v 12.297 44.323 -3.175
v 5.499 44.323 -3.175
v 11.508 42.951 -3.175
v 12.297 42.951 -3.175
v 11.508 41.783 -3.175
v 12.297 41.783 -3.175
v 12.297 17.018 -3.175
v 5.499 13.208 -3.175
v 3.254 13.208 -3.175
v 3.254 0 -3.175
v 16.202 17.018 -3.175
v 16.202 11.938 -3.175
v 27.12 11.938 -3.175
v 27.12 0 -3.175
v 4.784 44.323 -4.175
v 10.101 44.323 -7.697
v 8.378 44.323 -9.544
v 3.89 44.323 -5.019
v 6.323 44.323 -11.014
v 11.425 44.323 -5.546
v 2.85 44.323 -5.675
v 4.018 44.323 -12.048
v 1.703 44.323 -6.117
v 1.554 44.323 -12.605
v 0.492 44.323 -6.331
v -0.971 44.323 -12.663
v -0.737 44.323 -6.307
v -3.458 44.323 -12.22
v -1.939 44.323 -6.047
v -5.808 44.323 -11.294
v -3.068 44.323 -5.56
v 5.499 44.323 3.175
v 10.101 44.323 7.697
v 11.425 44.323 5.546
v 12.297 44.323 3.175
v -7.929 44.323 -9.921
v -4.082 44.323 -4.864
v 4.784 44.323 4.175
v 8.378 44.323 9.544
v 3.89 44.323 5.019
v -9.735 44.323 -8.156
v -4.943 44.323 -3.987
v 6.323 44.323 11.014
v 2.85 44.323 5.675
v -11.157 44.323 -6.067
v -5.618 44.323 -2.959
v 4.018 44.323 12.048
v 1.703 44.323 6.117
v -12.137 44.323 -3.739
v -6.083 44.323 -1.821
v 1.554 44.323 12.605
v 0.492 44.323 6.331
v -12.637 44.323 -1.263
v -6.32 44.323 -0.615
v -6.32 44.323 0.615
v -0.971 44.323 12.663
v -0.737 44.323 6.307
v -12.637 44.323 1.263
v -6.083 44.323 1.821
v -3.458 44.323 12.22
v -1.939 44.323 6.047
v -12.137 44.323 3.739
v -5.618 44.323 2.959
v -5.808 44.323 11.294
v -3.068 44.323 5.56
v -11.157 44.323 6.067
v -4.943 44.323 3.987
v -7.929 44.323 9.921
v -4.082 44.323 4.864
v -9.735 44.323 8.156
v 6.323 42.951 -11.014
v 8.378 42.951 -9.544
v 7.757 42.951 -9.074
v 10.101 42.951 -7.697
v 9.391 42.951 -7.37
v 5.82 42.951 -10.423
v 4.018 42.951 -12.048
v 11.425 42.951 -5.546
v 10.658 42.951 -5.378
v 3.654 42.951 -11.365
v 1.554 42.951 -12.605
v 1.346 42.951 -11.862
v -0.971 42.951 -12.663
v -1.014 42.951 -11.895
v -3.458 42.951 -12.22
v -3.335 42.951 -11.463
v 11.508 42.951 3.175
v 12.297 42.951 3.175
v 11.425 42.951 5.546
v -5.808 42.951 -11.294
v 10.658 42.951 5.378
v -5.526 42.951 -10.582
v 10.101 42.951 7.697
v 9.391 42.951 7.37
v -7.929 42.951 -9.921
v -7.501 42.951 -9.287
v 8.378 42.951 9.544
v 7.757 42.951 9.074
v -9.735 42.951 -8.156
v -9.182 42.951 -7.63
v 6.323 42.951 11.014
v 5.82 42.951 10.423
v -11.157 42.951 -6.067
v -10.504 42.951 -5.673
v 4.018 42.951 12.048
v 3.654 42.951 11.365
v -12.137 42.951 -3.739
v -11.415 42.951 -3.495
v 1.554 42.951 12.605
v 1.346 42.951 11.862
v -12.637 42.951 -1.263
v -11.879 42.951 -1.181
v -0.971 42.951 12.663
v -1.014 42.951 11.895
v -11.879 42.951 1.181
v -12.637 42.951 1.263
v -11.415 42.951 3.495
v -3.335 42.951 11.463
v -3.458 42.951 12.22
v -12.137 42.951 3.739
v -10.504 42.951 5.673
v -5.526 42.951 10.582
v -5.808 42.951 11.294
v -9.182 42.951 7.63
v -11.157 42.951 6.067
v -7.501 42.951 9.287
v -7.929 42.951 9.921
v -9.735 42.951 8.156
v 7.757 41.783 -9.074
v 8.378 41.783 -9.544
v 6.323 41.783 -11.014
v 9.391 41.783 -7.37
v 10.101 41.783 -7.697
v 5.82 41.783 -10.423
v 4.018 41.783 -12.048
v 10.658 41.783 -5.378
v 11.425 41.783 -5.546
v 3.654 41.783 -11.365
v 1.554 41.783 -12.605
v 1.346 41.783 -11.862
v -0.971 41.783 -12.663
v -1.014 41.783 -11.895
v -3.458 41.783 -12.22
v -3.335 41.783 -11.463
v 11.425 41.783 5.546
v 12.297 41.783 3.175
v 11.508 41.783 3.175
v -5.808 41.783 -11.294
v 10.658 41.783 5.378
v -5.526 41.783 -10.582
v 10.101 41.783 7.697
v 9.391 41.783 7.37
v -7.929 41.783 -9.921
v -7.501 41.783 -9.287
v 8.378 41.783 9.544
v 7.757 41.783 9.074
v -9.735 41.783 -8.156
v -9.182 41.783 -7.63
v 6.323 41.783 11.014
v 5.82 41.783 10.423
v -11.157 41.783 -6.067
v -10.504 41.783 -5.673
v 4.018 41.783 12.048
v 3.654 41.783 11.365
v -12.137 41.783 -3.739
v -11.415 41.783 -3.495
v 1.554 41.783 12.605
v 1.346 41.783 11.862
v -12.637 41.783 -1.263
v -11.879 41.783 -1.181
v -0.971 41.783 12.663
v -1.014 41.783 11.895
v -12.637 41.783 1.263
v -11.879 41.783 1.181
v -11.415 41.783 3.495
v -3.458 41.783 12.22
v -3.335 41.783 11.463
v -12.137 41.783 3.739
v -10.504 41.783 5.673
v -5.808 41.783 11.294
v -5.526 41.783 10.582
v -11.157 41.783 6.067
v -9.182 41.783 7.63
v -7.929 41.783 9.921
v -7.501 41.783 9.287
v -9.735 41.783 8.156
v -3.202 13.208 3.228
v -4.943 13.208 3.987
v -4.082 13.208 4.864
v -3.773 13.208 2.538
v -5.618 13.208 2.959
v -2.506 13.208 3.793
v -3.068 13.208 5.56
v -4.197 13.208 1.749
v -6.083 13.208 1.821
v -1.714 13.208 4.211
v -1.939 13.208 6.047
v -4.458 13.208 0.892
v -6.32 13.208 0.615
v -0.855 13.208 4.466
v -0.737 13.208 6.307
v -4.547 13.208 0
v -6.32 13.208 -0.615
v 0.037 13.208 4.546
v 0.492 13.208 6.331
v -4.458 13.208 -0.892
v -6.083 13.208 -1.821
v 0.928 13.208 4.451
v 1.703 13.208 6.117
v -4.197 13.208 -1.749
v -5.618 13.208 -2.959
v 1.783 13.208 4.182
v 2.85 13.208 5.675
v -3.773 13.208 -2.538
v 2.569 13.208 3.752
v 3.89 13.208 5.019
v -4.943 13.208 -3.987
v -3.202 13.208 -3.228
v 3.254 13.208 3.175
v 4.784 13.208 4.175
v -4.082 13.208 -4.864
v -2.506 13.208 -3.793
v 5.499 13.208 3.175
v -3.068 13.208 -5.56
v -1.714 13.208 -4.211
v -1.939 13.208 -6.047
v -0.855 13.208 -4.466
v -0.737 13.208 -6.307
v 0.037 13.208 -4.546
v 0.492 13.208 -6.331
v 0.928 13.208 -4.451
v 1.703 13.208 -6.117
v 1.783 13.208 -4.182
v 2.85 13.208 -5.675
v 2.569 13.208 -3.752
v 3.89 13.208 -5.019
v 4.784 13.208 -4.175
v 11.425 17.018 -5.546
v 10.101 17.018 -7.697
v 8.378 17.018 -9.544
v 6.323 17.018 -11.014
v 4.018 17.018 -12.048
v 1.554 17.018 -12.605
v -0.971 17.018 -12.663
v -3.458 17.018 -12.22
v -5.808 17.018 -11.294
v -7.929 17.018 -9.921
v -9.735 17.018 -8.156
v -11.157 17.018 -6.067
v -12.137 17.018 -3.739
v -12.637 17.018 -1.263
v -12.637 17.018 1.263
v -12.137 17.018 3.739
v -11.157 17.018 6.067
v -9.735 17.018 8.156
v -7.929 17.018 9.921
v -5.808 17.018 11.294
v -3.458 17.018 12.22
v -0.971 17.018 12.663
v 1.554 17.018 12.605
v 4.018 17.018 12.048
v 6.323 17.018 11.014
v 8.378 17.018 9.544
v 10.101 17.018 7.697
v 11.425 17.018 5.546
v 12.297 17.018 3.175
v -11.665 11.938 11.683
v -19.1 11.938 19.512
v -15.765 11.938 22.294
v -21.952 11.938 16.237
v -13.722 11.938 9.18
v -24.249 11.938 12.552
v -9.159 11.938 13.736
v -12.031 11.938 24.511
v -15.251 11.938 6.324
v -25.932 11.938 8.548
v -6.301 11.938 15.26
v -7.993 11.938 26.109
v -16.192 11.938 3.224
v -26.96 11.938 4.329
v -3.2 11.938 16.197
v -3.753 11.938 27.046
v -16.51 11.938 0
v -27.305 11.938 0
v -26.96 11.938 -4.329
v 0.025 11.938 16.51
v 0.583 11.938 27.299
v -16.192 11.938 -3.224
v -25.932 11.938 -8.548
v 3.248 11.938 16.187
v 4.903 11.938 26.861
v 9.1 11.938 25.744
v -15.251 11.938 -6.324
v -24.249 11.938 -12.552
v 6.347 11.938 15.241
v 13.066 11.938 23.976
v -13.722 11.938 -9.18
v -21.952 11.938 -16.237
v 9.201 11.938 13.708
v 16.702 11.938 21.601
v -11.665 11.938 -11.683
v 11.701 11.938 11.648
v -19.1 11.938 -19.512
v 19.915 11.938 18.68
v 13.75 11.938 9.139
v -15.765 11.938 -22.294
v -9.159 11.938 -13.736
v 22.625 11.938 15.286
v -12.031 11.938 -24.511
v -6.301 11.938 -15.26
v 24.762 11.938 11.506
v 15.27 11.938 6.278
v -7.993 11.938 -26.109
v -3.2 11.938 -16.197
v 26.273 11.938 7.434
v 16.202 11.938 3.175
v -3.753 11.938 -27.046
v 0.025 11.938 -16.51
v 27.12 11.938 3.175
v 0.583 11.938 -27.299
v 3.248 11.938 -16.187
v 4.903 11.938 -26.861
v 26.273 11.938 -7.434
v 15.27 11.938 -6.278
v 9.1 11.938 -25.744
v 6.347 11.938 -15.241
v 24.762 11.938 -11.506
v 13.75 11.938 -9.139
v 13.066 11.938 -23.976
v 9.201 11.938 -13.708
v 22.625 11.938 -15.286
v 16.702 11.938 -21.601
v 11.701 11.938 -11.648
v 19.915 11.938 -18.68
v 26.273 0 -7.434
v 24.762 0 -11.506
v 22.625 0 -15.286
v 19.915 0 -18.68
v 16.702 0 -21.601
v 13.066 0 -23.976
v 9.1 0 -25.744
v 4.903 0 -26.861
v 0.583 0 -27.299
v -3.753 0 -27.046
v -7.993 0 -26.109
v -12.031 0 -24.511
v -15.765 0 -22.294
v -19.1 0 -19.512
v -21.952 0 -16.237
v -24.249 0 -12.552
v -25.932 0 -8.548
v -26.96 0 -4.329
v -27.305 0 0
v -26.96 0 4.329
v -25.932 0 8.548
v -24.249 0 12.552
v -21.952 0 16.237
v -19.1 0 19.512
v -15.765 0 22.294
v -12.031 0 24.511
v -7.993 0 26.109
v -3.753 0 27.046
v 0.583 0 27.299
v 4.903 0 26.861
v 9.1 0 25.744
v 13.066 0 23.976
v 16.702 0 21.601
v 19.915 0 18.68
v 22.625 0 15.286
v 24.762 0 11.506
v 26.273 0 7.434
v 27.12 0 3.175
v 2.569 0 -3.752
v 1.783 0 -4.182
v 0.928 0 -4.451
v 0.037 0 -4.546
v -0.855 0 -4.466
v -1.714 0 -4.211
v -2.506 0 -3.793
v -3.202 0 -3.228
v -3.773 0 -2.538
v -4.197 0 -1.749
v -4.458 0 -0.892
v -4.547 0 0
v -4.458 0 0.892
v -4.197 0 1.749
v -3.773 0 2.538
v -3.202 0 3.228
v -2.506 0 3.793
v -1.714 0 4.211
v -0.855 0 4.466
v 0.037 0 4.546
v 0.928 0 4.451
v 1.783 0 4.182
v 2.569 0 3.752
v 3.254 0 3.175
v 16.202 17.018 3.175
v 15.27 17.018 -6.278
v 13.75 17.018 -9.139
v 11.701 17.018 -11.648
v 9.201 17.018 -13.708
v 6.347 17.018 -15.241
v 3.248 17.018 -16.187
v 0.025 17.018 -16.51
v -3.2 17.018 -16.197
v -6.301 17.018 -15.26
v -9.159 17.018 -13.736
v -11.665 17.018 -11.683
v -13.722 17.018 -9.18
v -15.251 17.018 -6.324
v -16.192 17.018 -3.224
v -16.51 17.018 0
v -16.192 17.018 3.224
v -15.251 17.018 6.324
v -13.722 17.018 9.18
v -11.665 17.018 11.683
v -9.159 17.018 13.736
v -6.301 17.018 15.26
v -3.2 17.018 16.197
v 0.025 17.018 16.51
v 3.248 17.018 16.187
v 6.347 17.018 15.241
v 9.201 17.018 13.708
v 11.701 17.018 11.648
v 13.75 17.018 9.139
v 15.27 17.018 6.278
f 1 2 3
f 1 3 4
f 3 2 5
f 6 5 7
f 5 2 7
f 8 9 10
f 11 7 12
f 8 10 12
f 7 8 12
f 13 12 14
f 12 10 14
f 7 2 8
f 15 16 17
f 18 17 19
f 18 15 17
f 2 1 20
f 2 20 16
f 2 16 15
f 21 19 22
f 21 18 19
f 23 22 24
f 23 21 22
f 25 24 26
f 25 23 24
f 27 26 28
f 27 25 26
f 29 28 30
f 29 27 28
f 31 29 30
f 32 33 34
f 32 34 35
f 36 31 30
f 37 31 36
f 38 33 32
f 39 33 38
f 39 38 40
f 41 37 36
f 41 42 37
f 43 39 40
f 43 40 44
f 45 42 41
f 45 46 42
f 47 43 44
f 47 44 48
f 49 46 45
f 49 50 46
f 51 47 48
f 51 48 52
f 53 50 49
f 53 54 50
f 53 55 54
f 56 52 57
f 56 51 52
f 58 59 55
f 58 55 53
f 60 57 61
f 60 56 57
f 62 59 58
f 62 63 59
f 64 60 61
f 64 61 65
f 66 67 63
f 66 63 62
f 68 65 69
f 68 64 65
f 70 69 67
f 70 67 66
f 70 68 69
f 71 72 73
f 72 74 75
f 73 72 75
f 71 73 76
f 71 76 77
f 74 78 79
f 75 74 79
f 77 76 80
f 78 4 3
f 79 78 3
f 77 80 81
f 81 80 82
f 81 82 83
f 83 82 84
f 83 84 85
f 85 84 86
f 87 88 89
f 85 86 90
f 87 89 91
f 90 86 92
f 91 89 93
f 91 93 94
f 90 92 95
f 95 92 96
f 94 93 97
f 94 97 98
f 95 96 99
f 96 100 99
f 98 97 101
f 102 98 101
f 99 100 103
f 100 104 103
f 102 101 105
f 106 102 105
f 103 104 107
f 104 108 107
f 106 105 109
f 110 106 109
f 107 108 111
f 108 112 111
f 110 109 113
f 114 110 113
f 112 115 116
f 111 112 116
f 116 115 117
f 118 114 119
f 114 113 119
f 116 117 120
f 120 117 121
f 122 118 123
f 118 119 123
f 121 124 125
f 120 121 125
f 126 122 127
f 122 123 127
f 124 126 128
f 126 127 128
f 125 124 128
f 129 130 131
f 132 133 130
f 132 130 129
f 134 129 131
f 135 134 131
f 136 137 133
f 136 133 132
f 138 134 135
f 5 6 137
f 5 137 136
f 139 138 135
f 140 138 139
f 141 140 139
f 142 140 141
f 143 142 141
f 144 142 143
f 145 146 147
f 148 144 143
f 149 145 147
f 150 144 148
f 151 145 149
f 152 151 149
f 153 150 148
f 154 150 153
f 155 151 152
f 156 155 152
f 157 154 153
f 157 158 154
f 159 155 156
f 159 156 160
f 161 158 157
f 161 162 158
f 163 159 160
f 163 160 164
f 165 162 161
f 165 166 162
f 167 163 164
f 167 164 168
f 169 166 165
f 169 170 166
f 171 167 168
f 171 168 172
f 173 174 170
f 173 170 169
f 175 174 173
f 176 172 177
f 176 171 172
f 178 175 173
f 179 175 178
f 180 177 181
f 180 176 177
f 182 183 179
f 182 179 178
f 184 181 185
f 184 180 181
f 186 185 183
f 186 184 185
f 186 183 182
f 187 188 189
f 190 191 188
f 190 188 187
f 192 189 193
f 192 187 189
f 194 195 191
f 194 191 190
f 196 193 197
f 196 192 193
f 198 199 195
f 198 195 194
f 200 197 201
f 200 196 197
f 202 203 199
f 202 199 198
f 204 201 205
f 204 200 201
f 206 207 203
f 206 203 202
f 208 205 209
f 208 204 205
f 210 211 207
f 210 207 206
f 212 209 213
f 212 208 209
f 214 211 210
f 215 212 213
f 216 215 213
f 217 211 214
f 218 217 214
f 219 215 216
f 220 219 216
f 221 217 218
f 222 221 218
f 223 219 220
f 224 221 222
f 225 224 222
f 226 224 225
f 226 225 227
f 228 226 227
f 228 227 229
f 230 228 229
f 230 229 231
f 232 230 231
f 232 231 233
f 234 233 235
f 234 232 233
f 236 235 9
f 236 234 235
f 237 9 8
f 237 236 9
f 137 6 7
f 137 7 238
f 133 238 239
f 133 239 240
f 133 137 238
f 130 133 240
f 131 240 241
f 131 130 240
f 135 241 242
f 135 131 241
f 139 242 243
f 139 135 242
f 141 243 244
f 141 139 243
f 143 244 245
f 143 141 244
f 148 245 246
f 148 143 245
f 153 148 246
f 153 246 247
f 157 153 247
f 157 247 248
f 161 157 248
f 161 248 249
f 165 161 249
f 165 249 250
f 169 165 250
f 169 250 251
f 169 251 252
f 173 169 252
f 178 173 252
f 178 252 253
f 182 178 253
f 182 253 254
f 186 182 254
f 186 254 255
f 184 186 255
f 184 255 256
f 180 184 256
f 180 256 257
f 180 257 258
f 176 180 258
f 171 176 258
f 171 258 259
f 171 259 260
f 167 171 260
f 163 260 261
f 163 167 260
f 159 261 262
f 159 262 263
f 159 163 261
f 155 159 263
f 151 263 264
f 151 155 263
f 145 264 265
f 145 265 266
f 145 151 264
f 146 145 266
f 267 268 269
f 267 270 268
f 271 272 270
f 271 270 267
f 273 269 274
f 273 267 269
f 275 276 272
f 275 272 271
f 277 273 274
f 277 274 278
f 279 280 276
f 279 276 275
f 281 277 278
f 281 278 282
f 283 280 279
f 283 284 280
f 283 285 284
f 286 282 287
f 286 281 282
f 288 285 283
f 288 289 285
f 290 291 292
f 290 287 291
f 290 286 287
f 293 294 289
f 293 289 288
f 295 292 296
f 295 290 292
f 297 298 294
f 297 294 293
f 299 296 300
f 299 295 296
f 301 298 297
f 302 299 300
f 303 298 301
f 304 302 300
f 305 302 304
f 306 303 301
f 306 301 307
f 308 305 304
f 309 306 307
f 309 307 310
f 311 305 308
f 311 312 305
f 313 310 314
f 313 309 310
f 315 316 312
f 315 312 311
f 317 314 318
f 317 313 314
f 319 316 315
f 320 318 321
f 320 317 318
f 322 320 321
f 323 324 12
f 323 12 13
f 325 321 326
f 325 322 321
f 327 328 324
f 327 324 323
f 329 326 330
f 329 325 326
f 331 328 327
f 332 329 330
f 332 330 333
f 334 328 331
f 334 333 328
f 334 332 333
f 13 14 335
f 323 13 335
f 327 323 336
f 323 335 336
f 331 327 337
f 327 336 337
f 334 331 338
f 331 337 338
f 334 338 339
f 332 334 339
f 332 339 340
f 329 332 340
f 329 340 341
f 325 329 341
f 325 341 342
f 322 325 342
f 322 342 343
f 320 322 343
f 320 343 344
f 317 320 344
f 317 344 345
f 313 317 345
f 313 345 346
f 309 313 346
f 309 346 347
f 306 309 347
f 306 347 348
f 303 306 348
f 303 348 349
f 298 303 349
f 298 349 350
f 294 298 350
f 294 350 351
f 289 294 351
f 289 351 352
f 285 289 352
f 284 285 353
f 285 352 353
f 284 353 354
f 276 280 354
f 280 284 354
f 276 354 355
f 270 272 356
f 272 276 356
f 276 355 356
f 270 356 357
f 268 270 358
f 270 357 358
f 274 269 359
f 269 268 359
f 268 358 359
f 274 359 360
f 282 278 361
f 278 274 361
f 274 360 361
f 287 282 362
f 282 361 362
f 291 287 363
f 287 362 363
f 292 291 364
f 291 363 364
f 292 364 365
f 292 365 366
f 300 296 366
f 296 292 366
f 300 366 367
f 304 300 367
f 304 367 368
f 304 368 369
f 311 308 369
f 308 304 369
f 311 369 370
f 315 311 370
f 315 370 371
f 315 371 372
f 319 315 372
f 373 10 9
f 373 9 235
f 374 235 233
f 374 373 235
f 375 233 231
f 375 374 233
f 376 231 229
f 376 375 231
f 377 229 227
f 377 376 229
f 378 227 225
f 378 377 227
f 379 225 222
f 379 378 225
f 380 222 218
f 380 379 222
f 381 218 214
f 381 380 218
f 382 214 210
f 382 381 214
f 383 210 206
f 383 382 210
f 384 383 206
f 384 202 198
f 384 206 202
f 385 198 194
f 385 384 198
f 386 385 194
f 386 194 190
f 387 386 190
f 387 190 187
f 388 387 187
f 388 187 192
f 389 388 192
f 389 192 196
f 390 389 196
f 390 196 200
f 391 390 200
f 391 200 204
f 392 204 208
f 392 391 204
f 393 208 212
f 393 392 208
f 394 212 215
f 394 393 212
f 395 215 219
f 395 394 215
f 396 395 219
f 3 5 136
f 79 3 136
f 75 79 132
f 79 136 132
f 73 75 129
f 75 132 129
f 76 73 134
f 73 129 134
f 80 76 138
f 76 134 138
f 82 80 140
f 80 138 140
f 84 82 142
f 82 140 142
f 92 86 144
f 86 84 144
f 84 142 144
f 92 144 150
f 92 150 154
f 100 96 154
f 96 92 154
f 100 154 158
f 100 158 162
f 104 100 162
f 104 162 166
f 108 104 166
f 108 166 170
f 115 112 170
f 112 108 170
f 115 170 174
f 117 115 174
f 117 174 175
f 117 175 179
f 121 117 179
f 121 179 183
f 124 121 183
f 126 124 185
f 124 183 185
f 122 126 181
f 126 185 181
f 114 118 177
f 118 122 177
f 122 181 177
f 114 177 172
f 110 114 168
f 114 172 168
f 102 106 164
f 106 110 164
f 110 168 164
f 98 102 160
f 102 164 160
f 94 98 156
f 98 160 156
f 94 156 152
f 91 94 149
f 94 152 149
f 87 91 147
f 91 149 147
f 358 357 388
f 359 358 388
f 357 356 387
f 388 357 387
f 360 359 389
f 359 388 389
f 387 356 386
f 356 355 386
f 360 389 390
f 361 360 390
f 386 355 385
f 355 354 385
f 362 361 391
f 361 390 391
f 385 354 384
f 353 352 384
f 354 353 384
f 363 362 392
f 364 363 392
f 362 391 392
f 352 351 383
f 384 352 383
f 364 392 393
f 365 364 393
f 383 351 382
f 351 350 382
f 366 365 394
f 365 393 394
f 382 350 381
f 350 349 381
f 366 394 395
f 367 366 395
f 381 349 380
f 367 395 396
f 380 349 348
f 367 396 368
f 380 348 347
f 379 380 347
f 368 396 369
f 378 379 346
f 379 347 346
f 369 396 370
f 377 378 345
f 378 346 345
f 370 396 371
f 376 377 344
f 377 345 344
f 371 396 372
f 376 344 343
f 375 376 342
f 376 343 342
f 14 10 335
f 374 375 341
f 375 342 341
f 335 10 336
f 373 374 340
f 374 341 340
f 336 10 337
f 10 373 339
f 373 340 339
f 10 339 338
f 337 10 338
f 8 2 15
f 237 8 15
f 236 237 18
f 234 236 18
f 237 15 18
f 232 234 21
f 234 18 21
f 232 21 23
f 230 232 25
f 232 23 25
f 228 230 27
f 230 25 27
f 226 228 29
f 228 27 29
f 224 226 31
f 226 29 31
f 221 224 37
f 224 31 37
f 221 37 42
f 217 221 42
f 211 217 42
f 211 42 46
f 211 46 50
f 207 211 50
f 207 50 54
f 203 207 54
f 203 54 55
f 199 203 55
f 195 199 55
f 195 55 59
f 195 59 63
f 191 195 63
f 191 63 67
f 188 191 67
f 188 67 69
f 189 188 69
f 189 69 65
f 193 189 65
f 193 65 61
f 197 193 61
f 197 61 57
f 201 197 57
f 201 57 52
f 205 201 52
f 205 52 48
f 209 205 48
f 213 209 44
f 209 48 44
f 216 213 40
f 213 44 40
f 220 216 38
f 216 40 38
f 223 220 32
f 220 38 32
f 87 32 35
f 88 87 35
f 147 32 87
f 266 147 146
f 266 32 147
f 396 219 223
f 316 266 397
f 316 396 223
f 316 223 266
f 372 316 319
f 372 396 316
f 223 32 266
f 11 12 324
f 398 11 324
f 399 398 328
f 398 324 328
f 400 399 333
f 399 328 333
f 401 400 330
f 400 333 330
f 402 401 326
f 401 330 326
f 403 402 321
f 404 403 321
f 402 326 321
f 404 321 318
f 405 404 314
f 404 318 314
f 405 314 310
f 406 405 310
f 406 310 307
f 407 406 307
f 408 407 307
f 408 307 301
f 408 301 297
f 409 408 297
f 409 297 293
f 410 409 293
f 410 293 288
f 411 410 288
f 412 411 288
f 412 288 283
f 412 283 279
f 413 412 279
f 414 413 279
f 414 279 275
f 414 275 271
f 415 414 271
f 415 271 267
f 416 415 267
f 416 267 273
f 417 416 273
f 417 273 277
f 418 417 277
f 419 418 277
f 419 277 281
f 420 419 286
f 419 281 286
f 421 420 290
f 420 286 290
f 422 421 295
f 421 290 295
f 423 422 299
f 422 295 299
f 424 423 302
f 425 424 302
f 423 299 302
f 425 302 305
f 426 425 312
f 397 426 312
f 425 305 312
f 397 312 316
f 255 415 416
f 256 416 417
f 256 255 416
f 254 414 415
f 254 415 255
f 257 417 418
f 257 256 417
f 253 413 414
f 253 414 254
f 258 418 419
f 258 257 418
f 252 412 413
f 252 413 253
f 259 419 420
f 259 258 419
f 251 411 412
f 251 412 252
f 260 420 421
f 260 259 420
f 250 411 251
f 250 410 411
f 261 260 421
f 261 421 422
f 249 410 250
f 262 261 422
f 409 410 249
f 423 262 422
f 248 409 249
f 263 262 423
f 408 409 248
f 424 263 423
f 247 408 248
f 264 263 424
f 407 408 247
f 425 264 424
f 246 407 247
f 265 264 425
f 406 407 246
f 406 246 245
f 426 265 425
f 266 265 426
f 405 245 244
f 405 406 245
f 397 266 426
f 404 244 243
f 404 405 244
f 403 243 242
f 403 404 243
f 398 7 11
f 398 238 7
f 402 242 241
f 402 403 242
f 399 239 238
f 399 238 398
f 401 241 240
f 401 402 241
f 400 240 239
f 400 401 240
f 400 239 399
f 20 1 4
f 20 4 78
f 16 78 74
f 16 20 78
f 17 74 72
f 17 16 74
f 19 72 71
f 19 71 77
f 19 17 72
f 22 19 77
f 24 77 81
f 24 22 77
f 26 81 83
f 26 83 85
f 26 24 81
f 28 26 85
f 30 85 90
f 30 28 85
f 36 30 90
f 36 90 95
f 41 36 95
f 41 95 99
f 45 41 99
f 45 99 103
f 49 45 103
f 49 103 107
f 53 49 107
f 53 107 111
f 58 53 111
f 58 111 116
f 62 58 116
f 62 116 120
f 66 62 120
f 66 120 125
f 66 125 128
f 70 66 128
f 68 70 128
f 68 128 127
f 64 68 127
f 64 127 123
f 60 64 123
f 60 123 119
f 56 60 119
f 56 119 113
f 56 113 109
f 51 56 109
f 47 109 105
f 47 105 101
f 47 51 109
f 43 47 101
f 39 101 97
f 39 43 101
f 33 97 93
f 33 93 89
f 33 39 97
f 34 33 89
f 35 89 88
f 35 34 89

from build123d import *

# Parameters (mm, degrees)
SKETCH1_R           = 27.305
SKETCH1_R_2         = 4.5466
BOSS_EXTRUDE1_DEPTH = 57.658
SKETCH2_R           = 6.35
CUT_EXTRUDE1_DEPTH  = 44.45
SKETCH3_OUTSIDE_W   = 75.886
SKETCH3_OUTSIDE_H   = 75.886
SKETCH3_OUTSIDE_R   = 12.7
CUT_EXTRUDE2_DEPTH  = 44.45
SKETCH10_W          = 30.679481275
SKETCH10_H          = 6.35
CUT_EXTRUDE7_DEPTH  = 6.35
SKETCH13_OUTSIDE_W  = 75.886
SKETCH13_OUTSIDE_H  = 75.886
SKETCH13_OUTSIDE_R  = 11.938
CUT_EXTRUDE9_DEPTH  = 1.1684
SKETCH16_R          = 46.08237905
CUT_EXTRUDE11_DEPTH = 59.784814187
BOSS_EXTRUDE4_START = 3.81
SKETCH18_R          = 16.51
SKETCH18_R_2        = 12.7
BOSS_EXTRUDE4_DEPTH = 3.81
SKETCH19_OUTSIDE_W  = 74.42
SKETCH19_OUTSIDE_H  = 74.42
SKETCH19_OUTSIDE_R  = 16.51
CUT_EXTRUDE12_DEPTH = 1.27
SKETCH10_2_W        = 30.679481275
SKETCH10_2_H        = 6.35
CUT_EXTRUDE13_DEPTH = 59.784814187


with BuildPart() as part:
    # Sketch1 → Boss-Extrude1 (new body)
    with BuildSketch(Plane(origin=(0, 0, 0), x_dir=(1, 0, 0), z_dir=(0, 1, 0))):
        Circle(SKETCH1_R)
        Circle(SKETCH1_R_2, mode=Mode.SUBTRACT)
    extrude(amount=BOSS_EXTRUDE1_DEPTH)

    # Sketch2 → Cut-Extrude1 (cut)
    with BuildSketch(Plane(origin=(0, 57.658, 0), x_dir=(1, 0, 0), z_dir=(0, 1, 0))):
        Circle(SKETCH2_R)
    extrude(amount=-CUT_EXTRUDE1_DEPTH, mode=Mode.SUBTRACT)

    # Sketch3 outside → Cut-Extrude2 (cut)
    with BuildSketch(Plane(origin=(0, 57.658, 0), x_dir=(1, 0, 0), z_dir=(0, 1, 0))):
        Rectangle(SKETCH3_OUTSIDE_W, SKETCH3_OUTSIDE_H)
        Circle(SKETCH3_OUTSIDE_R, mode=Mode.SUBTRACT)
    extrude(amount=-CUT_EXTRUDE2_DEPTH, mode=Mode.SUBTRACT)

    # Sketch10 → Cut-Extrude7 (cut)
    with BuildSketch(Plane.XZ):
        with Locations((17.839550223, 0)):
            Rectangle(SKETCH10_W, SKETCH10_H)
    extrude(amount=-CUT_EXTRUDE7_DEPTH, mode=Mode.SUBTRACT)

    # Sketch13 outside → Cut-Extrude9 (cut)
    with BuildSketch(Plane(origin=(0, 41.783, 0), x_dir=(-1, 0, 0), z_dir=(0, 1, 0))):
        Rectangle(SKETCH13_OUTSIDE_W, SKETCH13_OUTSIDE_H)
        Circle(SKETCH13_OUTSIDE_R, mode=Mode.SUBTRACT)
    extrude(amount=CUT_EXTRUDE9_DEPTH, mode=Mode.SUBTRACT)

    # Sketch16 → Cut-Extrude11 (cut, through all)
    with BuildSketch(Plane(origin=(0, 44.323, 0), x_dir=(-1, 0, 0), z_dir=(0, 1, 0))):
        Circle(SKETCH16_R)
    extrude(amount=CUT_EXTRUDE11_DEPTH, mode=Mode.SUBTRACT)

    # Sketch18 → Boss-Extrude4 (add)
    with BuildSketch(Plane(origin=(0, 13.208, 0), x_dir=(1, 0, 0), z_dir=(0, 1, 0)).offset(BOSS_EXTRUDE4_START)):
        Circle(SKETCH18_R)
        Circle(SKETCH18_R_2, mode=Mode.SUBTRACT)
    extrude(amount=-BOSS_EXTRUDE4_DEPTH)

    # Sketch19 outside → Cut-Extrude12 (cut)
    with BuildSketch(Plane(origin=(0, 13.208, 0), x_dir=(1, 0, 0), z_dir=(0, 1, 0))):
        Rectangle(SKETCH19_OUTSIDE_W, SKETCH19_OUTSIDE_H)
        Circle(SKETCH19_OUTSIDE_R, mode=Mode.SUBTRACT)
    extrude(amount=-CUT_EXTRUDE12_DEPTH, mode=Mode.SUBTRACT)

    # Sketch10<2> → Cut-Extrude13 (cut, through all)
    with BuildSketch(Plane.XZ):
        with Locations((17.839550223, 0)):
            Rectangle(SKETCH10_2_W, SKETCH10_2_H)
    extrude(amount=-CUT_EXTRUDE13_DEPTH, mode=Mode.SUBTRACT)


solid = part.part
